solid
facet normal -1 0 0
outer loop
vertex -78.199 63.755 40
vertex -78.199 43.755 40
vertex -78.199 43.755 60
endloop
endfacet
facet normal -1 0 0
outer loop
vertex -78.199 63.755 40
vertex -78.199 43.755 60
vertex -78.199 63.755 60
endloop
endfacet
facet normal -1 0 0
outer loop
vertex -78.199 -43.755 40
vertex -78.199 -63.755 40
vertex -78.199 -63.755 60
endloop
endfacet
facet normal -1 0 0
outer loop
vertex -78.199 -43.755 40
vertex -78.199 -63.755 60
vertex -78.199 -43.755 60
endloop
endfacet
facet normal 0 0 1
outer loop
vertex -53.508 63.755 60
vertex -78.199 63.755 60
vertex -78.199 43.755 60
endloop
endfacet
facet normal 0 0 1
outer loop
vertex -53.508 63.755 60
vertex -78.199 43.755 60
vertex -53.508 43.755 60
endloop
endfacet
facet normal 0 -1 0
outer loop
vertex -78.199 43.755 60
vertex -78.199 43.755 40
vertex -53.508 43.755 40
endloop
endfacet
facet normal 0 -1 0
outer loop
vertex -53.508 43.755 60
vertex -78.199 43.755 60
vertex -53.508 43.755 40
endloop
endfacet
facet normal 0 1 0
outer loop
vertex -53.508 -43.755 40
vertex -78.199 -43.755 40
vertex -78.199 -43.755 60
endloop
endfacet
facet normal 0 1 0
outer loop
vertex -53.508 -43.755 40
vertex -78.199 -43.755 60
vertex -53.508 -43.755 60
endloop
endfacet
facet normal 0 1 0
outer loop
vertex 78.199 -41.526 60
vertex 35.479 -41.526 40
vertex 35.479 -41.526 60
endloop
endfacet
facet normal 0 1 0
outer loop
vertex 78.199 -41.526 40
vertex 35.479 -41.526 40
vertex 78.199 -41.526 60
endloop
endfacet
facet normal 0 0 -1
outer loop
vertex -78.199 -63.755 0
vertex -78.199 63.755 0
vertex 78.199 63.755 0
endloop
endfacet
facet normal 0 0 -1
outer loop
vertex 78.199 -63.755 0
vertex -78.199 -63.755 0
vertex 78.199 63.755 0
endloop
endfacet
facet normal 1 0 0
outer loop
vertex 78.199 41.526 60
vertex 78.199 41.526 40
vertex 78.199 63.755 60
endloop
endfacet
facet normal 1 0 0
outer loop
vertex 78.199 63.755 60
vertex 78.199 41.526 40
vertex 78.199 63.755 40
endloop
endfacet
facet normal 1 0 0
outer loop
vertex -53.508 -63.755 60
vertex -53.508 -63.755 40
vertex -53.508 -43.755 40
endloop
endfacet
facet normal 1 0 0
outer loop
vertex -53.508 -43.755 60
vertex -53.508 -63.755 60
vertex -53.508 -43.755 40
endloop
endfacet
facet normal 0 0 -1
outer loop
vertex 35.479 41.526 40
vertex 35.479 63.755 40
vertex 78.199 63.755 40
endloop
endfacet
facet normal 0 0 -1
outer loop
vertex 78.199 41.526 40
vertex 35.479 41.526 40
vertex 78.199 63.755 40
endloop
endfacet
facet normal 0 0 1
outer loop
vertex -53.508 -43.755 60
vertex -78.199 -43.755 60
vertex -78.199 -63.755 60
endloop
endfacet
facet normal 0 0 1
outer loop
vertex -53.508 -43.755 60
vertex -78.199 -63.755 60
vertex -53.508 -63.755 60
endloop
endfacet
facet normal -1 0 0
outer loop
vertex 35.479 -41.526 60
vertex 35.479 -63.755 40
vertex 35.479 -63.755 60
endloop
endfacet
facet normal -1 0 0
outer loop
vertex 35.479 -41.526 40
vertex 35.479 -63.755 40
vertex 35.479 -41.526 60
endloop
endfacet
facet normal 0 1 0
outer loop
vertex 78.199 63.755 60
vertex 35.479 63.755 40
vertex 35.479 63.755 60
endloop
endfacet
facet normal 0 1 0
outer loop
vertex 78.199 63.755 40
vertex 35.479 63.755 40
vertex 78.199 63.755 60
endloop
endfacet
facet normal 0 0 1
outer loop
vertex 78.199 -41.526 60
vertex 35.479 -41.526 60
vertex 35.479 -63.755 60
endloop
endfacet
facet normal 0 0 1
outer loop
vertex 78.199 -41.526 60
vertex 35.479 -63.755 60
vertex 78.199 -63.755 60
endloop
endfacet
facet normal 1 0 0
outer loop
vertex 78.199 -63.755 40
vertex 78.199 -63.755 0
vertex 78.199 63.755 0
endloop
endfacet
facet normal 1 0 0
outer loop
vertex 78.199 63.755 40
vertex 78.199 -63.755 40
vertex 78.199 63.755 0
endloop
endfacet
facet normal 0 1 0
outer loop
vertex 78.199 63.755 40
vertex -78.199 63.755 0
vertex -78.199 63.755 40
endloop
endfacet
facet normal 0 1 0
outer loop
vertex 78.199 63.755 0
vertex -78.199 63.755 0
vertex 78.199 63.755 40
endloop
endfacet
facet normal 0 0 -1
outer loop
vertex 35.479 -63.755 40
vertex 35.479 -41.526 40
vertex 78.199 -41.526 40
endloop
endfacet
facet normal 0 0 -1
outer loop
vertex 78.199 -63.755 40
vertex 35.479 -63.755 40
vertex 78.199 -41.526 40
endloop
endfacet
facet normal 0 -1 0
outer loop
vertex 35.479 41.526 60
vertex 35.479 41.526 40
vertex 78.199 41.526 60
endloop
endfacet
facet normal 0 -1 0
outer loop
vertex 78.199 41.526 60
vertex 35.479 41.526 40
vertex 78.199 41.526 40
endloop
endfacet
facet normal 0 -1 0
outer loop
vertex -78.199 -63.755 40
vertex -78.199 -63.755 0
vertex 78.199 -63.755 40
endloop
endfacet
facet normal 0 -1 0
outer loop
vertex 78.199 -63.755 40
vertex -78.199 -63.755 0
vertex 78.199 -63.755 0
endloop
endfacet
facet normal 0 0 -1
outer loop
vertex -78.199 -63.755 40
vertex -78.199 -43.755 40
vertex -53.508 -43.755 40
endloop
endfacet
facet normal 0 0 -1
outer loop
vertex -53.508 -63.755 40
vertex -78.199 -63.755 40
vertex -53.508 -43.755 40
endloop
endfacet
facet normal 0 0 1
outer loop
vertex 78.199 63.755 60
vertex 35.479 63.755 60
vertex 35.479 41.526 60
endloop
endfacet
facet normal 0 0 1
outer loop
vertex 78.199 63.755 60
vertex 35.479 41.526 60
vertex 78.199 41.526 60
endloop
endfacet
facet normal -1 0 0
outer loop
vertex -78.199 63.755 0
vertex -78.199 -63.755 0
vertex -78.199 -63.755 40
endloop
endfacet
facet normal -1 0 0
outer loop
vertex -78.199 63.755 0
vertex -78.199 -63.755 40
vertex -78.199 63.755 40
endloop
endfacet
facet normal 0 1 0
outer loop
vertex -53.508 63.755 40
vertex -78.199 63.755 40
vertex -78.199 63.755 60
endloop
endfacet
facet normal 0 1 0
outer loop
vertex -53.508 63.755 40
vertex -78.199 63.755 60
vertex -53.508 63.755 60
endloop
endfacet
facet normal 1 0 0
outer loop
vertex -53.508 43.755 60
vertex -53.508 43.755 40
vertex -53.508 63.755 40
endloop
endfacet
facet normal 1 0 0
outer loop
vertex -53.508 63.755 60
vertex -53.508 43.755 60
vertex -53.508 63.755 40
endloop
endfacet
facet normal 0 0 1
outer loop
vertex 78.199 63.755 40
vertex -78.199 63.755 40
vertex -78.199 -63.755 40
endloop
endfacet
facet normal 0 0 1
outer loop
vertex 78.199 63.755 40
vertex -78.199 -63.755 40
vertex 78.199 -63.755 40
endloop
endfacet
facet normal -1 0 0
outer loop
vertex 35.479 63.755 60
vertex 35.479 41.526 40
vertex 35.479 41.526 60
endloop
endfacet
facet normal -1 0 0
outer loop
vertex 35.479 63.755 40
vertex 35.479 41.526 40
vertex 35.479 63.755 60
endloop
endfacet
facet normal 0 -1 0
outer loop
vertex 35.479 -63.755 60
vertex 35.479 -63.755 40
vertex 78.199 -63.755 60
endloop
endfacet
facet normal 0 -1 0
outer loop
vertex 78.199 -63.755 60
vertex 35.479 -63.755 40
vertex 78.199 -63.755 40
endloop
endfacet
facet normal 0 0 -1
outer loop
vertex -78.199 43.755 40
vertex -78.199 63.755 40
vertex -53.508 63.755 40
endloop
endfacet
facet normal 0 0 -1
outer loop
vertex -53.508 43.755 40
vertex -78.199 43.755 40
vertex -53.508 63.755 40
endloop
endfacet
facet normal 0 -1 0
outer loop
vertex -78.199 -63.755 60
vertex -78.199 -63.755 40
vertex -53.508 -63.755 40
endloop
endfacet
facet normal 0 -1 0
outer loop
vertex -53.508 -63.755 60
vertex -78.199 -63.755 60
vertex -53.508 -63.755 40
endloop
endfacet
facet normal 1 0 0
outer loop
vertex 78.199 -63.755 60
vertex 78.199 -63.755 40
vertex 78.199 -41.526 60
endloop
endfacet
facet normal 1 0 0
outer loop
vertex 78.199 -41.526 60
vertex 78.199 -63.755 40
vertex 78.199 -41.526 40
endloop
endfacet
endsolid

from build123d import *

# Parameters (mm, degrees)
ESBO_O1_W                  = 156.39786889
ESBO_O1_H                  = 127.51
NOVO_DEPTH                 = 40
ESBO_O2_W                  = 24.691065998
ESBO_O2_H                  = 20
RESSALTO_EXTRUS_O2_DEPTH   = 20
RESSALTO_EXTRUS_O2_2_DEPTH = 20
ESBO_O2_W_2                = 42.720162864
ESBO_O2_H_2                = 22.228889681
RESSALTO_EXTRUS_O2_3_DEPTH = 20
RESSALTO_EXTRUS_O2_4_DEPTH = 20


with BuildPart() as part:
    # Esboço1 → Novo (new body)
    with BuildSketch(Plane.XY):
        Rectangle(ESBO_O1_W, ESBO_O1_H)
    extrude(amount=NOVO_DEPTH)


with BuildPart() as body_2:
    # Esboço2 → Ressalto-extrusão2 (new body)
    with BuildSketch(Plane.XY.offset(40)):
        with Locations((-65.853401446, -53.755)):
            Rectangle(ESBO_O2_W, ESBO_O2_H)
    extrude(amount=RESSALTO_EXTRUS_O2_DEPTH)


with BuildPart() as body_3:
    # Esboço2 → Ressalto-extrus_o2 2 (new body)
    with BuildSketch(Plane.XY.offset(40)):
        with Locations((-65.853401446, 53.755)):
            Rectangle(ESBO_O2_W, ESBO_O2_H)
    extrude(amount=RESSALTO_EXTRUS_O2_2_DEPTH)


with BuildPart() as body_4:
    # Esboço2 → Ressalto-extrus_o2 3 (new body)
    with BuildSketch(Plane.XY.offset(40)):
        with Locations((56.838853013, 52.64055516)):
            Rectangle(ESBO_O2_W_2, ESBO_O2_H_2)
    extrude(amount=RESSALTO_EXTRUS_O2_3_DEPTH)


with BuildPart() as body_5:
    # Esboço2 → Ressalto-extrus_o2 4 (new body)
    with BuildSketch(Plane.XY.offset(40)):
        with Locations((56.838853013, -52.64055516)):
            Rectangle(ESBO_O2_W_2, ESBO_O2_H_2)
    extrude(amount=RESSALTO_EXTRUS_O2_4_DEPTH)


solid = Compound([part.part, body_2.part, body_3.part, body_4.part, body_5.part])
